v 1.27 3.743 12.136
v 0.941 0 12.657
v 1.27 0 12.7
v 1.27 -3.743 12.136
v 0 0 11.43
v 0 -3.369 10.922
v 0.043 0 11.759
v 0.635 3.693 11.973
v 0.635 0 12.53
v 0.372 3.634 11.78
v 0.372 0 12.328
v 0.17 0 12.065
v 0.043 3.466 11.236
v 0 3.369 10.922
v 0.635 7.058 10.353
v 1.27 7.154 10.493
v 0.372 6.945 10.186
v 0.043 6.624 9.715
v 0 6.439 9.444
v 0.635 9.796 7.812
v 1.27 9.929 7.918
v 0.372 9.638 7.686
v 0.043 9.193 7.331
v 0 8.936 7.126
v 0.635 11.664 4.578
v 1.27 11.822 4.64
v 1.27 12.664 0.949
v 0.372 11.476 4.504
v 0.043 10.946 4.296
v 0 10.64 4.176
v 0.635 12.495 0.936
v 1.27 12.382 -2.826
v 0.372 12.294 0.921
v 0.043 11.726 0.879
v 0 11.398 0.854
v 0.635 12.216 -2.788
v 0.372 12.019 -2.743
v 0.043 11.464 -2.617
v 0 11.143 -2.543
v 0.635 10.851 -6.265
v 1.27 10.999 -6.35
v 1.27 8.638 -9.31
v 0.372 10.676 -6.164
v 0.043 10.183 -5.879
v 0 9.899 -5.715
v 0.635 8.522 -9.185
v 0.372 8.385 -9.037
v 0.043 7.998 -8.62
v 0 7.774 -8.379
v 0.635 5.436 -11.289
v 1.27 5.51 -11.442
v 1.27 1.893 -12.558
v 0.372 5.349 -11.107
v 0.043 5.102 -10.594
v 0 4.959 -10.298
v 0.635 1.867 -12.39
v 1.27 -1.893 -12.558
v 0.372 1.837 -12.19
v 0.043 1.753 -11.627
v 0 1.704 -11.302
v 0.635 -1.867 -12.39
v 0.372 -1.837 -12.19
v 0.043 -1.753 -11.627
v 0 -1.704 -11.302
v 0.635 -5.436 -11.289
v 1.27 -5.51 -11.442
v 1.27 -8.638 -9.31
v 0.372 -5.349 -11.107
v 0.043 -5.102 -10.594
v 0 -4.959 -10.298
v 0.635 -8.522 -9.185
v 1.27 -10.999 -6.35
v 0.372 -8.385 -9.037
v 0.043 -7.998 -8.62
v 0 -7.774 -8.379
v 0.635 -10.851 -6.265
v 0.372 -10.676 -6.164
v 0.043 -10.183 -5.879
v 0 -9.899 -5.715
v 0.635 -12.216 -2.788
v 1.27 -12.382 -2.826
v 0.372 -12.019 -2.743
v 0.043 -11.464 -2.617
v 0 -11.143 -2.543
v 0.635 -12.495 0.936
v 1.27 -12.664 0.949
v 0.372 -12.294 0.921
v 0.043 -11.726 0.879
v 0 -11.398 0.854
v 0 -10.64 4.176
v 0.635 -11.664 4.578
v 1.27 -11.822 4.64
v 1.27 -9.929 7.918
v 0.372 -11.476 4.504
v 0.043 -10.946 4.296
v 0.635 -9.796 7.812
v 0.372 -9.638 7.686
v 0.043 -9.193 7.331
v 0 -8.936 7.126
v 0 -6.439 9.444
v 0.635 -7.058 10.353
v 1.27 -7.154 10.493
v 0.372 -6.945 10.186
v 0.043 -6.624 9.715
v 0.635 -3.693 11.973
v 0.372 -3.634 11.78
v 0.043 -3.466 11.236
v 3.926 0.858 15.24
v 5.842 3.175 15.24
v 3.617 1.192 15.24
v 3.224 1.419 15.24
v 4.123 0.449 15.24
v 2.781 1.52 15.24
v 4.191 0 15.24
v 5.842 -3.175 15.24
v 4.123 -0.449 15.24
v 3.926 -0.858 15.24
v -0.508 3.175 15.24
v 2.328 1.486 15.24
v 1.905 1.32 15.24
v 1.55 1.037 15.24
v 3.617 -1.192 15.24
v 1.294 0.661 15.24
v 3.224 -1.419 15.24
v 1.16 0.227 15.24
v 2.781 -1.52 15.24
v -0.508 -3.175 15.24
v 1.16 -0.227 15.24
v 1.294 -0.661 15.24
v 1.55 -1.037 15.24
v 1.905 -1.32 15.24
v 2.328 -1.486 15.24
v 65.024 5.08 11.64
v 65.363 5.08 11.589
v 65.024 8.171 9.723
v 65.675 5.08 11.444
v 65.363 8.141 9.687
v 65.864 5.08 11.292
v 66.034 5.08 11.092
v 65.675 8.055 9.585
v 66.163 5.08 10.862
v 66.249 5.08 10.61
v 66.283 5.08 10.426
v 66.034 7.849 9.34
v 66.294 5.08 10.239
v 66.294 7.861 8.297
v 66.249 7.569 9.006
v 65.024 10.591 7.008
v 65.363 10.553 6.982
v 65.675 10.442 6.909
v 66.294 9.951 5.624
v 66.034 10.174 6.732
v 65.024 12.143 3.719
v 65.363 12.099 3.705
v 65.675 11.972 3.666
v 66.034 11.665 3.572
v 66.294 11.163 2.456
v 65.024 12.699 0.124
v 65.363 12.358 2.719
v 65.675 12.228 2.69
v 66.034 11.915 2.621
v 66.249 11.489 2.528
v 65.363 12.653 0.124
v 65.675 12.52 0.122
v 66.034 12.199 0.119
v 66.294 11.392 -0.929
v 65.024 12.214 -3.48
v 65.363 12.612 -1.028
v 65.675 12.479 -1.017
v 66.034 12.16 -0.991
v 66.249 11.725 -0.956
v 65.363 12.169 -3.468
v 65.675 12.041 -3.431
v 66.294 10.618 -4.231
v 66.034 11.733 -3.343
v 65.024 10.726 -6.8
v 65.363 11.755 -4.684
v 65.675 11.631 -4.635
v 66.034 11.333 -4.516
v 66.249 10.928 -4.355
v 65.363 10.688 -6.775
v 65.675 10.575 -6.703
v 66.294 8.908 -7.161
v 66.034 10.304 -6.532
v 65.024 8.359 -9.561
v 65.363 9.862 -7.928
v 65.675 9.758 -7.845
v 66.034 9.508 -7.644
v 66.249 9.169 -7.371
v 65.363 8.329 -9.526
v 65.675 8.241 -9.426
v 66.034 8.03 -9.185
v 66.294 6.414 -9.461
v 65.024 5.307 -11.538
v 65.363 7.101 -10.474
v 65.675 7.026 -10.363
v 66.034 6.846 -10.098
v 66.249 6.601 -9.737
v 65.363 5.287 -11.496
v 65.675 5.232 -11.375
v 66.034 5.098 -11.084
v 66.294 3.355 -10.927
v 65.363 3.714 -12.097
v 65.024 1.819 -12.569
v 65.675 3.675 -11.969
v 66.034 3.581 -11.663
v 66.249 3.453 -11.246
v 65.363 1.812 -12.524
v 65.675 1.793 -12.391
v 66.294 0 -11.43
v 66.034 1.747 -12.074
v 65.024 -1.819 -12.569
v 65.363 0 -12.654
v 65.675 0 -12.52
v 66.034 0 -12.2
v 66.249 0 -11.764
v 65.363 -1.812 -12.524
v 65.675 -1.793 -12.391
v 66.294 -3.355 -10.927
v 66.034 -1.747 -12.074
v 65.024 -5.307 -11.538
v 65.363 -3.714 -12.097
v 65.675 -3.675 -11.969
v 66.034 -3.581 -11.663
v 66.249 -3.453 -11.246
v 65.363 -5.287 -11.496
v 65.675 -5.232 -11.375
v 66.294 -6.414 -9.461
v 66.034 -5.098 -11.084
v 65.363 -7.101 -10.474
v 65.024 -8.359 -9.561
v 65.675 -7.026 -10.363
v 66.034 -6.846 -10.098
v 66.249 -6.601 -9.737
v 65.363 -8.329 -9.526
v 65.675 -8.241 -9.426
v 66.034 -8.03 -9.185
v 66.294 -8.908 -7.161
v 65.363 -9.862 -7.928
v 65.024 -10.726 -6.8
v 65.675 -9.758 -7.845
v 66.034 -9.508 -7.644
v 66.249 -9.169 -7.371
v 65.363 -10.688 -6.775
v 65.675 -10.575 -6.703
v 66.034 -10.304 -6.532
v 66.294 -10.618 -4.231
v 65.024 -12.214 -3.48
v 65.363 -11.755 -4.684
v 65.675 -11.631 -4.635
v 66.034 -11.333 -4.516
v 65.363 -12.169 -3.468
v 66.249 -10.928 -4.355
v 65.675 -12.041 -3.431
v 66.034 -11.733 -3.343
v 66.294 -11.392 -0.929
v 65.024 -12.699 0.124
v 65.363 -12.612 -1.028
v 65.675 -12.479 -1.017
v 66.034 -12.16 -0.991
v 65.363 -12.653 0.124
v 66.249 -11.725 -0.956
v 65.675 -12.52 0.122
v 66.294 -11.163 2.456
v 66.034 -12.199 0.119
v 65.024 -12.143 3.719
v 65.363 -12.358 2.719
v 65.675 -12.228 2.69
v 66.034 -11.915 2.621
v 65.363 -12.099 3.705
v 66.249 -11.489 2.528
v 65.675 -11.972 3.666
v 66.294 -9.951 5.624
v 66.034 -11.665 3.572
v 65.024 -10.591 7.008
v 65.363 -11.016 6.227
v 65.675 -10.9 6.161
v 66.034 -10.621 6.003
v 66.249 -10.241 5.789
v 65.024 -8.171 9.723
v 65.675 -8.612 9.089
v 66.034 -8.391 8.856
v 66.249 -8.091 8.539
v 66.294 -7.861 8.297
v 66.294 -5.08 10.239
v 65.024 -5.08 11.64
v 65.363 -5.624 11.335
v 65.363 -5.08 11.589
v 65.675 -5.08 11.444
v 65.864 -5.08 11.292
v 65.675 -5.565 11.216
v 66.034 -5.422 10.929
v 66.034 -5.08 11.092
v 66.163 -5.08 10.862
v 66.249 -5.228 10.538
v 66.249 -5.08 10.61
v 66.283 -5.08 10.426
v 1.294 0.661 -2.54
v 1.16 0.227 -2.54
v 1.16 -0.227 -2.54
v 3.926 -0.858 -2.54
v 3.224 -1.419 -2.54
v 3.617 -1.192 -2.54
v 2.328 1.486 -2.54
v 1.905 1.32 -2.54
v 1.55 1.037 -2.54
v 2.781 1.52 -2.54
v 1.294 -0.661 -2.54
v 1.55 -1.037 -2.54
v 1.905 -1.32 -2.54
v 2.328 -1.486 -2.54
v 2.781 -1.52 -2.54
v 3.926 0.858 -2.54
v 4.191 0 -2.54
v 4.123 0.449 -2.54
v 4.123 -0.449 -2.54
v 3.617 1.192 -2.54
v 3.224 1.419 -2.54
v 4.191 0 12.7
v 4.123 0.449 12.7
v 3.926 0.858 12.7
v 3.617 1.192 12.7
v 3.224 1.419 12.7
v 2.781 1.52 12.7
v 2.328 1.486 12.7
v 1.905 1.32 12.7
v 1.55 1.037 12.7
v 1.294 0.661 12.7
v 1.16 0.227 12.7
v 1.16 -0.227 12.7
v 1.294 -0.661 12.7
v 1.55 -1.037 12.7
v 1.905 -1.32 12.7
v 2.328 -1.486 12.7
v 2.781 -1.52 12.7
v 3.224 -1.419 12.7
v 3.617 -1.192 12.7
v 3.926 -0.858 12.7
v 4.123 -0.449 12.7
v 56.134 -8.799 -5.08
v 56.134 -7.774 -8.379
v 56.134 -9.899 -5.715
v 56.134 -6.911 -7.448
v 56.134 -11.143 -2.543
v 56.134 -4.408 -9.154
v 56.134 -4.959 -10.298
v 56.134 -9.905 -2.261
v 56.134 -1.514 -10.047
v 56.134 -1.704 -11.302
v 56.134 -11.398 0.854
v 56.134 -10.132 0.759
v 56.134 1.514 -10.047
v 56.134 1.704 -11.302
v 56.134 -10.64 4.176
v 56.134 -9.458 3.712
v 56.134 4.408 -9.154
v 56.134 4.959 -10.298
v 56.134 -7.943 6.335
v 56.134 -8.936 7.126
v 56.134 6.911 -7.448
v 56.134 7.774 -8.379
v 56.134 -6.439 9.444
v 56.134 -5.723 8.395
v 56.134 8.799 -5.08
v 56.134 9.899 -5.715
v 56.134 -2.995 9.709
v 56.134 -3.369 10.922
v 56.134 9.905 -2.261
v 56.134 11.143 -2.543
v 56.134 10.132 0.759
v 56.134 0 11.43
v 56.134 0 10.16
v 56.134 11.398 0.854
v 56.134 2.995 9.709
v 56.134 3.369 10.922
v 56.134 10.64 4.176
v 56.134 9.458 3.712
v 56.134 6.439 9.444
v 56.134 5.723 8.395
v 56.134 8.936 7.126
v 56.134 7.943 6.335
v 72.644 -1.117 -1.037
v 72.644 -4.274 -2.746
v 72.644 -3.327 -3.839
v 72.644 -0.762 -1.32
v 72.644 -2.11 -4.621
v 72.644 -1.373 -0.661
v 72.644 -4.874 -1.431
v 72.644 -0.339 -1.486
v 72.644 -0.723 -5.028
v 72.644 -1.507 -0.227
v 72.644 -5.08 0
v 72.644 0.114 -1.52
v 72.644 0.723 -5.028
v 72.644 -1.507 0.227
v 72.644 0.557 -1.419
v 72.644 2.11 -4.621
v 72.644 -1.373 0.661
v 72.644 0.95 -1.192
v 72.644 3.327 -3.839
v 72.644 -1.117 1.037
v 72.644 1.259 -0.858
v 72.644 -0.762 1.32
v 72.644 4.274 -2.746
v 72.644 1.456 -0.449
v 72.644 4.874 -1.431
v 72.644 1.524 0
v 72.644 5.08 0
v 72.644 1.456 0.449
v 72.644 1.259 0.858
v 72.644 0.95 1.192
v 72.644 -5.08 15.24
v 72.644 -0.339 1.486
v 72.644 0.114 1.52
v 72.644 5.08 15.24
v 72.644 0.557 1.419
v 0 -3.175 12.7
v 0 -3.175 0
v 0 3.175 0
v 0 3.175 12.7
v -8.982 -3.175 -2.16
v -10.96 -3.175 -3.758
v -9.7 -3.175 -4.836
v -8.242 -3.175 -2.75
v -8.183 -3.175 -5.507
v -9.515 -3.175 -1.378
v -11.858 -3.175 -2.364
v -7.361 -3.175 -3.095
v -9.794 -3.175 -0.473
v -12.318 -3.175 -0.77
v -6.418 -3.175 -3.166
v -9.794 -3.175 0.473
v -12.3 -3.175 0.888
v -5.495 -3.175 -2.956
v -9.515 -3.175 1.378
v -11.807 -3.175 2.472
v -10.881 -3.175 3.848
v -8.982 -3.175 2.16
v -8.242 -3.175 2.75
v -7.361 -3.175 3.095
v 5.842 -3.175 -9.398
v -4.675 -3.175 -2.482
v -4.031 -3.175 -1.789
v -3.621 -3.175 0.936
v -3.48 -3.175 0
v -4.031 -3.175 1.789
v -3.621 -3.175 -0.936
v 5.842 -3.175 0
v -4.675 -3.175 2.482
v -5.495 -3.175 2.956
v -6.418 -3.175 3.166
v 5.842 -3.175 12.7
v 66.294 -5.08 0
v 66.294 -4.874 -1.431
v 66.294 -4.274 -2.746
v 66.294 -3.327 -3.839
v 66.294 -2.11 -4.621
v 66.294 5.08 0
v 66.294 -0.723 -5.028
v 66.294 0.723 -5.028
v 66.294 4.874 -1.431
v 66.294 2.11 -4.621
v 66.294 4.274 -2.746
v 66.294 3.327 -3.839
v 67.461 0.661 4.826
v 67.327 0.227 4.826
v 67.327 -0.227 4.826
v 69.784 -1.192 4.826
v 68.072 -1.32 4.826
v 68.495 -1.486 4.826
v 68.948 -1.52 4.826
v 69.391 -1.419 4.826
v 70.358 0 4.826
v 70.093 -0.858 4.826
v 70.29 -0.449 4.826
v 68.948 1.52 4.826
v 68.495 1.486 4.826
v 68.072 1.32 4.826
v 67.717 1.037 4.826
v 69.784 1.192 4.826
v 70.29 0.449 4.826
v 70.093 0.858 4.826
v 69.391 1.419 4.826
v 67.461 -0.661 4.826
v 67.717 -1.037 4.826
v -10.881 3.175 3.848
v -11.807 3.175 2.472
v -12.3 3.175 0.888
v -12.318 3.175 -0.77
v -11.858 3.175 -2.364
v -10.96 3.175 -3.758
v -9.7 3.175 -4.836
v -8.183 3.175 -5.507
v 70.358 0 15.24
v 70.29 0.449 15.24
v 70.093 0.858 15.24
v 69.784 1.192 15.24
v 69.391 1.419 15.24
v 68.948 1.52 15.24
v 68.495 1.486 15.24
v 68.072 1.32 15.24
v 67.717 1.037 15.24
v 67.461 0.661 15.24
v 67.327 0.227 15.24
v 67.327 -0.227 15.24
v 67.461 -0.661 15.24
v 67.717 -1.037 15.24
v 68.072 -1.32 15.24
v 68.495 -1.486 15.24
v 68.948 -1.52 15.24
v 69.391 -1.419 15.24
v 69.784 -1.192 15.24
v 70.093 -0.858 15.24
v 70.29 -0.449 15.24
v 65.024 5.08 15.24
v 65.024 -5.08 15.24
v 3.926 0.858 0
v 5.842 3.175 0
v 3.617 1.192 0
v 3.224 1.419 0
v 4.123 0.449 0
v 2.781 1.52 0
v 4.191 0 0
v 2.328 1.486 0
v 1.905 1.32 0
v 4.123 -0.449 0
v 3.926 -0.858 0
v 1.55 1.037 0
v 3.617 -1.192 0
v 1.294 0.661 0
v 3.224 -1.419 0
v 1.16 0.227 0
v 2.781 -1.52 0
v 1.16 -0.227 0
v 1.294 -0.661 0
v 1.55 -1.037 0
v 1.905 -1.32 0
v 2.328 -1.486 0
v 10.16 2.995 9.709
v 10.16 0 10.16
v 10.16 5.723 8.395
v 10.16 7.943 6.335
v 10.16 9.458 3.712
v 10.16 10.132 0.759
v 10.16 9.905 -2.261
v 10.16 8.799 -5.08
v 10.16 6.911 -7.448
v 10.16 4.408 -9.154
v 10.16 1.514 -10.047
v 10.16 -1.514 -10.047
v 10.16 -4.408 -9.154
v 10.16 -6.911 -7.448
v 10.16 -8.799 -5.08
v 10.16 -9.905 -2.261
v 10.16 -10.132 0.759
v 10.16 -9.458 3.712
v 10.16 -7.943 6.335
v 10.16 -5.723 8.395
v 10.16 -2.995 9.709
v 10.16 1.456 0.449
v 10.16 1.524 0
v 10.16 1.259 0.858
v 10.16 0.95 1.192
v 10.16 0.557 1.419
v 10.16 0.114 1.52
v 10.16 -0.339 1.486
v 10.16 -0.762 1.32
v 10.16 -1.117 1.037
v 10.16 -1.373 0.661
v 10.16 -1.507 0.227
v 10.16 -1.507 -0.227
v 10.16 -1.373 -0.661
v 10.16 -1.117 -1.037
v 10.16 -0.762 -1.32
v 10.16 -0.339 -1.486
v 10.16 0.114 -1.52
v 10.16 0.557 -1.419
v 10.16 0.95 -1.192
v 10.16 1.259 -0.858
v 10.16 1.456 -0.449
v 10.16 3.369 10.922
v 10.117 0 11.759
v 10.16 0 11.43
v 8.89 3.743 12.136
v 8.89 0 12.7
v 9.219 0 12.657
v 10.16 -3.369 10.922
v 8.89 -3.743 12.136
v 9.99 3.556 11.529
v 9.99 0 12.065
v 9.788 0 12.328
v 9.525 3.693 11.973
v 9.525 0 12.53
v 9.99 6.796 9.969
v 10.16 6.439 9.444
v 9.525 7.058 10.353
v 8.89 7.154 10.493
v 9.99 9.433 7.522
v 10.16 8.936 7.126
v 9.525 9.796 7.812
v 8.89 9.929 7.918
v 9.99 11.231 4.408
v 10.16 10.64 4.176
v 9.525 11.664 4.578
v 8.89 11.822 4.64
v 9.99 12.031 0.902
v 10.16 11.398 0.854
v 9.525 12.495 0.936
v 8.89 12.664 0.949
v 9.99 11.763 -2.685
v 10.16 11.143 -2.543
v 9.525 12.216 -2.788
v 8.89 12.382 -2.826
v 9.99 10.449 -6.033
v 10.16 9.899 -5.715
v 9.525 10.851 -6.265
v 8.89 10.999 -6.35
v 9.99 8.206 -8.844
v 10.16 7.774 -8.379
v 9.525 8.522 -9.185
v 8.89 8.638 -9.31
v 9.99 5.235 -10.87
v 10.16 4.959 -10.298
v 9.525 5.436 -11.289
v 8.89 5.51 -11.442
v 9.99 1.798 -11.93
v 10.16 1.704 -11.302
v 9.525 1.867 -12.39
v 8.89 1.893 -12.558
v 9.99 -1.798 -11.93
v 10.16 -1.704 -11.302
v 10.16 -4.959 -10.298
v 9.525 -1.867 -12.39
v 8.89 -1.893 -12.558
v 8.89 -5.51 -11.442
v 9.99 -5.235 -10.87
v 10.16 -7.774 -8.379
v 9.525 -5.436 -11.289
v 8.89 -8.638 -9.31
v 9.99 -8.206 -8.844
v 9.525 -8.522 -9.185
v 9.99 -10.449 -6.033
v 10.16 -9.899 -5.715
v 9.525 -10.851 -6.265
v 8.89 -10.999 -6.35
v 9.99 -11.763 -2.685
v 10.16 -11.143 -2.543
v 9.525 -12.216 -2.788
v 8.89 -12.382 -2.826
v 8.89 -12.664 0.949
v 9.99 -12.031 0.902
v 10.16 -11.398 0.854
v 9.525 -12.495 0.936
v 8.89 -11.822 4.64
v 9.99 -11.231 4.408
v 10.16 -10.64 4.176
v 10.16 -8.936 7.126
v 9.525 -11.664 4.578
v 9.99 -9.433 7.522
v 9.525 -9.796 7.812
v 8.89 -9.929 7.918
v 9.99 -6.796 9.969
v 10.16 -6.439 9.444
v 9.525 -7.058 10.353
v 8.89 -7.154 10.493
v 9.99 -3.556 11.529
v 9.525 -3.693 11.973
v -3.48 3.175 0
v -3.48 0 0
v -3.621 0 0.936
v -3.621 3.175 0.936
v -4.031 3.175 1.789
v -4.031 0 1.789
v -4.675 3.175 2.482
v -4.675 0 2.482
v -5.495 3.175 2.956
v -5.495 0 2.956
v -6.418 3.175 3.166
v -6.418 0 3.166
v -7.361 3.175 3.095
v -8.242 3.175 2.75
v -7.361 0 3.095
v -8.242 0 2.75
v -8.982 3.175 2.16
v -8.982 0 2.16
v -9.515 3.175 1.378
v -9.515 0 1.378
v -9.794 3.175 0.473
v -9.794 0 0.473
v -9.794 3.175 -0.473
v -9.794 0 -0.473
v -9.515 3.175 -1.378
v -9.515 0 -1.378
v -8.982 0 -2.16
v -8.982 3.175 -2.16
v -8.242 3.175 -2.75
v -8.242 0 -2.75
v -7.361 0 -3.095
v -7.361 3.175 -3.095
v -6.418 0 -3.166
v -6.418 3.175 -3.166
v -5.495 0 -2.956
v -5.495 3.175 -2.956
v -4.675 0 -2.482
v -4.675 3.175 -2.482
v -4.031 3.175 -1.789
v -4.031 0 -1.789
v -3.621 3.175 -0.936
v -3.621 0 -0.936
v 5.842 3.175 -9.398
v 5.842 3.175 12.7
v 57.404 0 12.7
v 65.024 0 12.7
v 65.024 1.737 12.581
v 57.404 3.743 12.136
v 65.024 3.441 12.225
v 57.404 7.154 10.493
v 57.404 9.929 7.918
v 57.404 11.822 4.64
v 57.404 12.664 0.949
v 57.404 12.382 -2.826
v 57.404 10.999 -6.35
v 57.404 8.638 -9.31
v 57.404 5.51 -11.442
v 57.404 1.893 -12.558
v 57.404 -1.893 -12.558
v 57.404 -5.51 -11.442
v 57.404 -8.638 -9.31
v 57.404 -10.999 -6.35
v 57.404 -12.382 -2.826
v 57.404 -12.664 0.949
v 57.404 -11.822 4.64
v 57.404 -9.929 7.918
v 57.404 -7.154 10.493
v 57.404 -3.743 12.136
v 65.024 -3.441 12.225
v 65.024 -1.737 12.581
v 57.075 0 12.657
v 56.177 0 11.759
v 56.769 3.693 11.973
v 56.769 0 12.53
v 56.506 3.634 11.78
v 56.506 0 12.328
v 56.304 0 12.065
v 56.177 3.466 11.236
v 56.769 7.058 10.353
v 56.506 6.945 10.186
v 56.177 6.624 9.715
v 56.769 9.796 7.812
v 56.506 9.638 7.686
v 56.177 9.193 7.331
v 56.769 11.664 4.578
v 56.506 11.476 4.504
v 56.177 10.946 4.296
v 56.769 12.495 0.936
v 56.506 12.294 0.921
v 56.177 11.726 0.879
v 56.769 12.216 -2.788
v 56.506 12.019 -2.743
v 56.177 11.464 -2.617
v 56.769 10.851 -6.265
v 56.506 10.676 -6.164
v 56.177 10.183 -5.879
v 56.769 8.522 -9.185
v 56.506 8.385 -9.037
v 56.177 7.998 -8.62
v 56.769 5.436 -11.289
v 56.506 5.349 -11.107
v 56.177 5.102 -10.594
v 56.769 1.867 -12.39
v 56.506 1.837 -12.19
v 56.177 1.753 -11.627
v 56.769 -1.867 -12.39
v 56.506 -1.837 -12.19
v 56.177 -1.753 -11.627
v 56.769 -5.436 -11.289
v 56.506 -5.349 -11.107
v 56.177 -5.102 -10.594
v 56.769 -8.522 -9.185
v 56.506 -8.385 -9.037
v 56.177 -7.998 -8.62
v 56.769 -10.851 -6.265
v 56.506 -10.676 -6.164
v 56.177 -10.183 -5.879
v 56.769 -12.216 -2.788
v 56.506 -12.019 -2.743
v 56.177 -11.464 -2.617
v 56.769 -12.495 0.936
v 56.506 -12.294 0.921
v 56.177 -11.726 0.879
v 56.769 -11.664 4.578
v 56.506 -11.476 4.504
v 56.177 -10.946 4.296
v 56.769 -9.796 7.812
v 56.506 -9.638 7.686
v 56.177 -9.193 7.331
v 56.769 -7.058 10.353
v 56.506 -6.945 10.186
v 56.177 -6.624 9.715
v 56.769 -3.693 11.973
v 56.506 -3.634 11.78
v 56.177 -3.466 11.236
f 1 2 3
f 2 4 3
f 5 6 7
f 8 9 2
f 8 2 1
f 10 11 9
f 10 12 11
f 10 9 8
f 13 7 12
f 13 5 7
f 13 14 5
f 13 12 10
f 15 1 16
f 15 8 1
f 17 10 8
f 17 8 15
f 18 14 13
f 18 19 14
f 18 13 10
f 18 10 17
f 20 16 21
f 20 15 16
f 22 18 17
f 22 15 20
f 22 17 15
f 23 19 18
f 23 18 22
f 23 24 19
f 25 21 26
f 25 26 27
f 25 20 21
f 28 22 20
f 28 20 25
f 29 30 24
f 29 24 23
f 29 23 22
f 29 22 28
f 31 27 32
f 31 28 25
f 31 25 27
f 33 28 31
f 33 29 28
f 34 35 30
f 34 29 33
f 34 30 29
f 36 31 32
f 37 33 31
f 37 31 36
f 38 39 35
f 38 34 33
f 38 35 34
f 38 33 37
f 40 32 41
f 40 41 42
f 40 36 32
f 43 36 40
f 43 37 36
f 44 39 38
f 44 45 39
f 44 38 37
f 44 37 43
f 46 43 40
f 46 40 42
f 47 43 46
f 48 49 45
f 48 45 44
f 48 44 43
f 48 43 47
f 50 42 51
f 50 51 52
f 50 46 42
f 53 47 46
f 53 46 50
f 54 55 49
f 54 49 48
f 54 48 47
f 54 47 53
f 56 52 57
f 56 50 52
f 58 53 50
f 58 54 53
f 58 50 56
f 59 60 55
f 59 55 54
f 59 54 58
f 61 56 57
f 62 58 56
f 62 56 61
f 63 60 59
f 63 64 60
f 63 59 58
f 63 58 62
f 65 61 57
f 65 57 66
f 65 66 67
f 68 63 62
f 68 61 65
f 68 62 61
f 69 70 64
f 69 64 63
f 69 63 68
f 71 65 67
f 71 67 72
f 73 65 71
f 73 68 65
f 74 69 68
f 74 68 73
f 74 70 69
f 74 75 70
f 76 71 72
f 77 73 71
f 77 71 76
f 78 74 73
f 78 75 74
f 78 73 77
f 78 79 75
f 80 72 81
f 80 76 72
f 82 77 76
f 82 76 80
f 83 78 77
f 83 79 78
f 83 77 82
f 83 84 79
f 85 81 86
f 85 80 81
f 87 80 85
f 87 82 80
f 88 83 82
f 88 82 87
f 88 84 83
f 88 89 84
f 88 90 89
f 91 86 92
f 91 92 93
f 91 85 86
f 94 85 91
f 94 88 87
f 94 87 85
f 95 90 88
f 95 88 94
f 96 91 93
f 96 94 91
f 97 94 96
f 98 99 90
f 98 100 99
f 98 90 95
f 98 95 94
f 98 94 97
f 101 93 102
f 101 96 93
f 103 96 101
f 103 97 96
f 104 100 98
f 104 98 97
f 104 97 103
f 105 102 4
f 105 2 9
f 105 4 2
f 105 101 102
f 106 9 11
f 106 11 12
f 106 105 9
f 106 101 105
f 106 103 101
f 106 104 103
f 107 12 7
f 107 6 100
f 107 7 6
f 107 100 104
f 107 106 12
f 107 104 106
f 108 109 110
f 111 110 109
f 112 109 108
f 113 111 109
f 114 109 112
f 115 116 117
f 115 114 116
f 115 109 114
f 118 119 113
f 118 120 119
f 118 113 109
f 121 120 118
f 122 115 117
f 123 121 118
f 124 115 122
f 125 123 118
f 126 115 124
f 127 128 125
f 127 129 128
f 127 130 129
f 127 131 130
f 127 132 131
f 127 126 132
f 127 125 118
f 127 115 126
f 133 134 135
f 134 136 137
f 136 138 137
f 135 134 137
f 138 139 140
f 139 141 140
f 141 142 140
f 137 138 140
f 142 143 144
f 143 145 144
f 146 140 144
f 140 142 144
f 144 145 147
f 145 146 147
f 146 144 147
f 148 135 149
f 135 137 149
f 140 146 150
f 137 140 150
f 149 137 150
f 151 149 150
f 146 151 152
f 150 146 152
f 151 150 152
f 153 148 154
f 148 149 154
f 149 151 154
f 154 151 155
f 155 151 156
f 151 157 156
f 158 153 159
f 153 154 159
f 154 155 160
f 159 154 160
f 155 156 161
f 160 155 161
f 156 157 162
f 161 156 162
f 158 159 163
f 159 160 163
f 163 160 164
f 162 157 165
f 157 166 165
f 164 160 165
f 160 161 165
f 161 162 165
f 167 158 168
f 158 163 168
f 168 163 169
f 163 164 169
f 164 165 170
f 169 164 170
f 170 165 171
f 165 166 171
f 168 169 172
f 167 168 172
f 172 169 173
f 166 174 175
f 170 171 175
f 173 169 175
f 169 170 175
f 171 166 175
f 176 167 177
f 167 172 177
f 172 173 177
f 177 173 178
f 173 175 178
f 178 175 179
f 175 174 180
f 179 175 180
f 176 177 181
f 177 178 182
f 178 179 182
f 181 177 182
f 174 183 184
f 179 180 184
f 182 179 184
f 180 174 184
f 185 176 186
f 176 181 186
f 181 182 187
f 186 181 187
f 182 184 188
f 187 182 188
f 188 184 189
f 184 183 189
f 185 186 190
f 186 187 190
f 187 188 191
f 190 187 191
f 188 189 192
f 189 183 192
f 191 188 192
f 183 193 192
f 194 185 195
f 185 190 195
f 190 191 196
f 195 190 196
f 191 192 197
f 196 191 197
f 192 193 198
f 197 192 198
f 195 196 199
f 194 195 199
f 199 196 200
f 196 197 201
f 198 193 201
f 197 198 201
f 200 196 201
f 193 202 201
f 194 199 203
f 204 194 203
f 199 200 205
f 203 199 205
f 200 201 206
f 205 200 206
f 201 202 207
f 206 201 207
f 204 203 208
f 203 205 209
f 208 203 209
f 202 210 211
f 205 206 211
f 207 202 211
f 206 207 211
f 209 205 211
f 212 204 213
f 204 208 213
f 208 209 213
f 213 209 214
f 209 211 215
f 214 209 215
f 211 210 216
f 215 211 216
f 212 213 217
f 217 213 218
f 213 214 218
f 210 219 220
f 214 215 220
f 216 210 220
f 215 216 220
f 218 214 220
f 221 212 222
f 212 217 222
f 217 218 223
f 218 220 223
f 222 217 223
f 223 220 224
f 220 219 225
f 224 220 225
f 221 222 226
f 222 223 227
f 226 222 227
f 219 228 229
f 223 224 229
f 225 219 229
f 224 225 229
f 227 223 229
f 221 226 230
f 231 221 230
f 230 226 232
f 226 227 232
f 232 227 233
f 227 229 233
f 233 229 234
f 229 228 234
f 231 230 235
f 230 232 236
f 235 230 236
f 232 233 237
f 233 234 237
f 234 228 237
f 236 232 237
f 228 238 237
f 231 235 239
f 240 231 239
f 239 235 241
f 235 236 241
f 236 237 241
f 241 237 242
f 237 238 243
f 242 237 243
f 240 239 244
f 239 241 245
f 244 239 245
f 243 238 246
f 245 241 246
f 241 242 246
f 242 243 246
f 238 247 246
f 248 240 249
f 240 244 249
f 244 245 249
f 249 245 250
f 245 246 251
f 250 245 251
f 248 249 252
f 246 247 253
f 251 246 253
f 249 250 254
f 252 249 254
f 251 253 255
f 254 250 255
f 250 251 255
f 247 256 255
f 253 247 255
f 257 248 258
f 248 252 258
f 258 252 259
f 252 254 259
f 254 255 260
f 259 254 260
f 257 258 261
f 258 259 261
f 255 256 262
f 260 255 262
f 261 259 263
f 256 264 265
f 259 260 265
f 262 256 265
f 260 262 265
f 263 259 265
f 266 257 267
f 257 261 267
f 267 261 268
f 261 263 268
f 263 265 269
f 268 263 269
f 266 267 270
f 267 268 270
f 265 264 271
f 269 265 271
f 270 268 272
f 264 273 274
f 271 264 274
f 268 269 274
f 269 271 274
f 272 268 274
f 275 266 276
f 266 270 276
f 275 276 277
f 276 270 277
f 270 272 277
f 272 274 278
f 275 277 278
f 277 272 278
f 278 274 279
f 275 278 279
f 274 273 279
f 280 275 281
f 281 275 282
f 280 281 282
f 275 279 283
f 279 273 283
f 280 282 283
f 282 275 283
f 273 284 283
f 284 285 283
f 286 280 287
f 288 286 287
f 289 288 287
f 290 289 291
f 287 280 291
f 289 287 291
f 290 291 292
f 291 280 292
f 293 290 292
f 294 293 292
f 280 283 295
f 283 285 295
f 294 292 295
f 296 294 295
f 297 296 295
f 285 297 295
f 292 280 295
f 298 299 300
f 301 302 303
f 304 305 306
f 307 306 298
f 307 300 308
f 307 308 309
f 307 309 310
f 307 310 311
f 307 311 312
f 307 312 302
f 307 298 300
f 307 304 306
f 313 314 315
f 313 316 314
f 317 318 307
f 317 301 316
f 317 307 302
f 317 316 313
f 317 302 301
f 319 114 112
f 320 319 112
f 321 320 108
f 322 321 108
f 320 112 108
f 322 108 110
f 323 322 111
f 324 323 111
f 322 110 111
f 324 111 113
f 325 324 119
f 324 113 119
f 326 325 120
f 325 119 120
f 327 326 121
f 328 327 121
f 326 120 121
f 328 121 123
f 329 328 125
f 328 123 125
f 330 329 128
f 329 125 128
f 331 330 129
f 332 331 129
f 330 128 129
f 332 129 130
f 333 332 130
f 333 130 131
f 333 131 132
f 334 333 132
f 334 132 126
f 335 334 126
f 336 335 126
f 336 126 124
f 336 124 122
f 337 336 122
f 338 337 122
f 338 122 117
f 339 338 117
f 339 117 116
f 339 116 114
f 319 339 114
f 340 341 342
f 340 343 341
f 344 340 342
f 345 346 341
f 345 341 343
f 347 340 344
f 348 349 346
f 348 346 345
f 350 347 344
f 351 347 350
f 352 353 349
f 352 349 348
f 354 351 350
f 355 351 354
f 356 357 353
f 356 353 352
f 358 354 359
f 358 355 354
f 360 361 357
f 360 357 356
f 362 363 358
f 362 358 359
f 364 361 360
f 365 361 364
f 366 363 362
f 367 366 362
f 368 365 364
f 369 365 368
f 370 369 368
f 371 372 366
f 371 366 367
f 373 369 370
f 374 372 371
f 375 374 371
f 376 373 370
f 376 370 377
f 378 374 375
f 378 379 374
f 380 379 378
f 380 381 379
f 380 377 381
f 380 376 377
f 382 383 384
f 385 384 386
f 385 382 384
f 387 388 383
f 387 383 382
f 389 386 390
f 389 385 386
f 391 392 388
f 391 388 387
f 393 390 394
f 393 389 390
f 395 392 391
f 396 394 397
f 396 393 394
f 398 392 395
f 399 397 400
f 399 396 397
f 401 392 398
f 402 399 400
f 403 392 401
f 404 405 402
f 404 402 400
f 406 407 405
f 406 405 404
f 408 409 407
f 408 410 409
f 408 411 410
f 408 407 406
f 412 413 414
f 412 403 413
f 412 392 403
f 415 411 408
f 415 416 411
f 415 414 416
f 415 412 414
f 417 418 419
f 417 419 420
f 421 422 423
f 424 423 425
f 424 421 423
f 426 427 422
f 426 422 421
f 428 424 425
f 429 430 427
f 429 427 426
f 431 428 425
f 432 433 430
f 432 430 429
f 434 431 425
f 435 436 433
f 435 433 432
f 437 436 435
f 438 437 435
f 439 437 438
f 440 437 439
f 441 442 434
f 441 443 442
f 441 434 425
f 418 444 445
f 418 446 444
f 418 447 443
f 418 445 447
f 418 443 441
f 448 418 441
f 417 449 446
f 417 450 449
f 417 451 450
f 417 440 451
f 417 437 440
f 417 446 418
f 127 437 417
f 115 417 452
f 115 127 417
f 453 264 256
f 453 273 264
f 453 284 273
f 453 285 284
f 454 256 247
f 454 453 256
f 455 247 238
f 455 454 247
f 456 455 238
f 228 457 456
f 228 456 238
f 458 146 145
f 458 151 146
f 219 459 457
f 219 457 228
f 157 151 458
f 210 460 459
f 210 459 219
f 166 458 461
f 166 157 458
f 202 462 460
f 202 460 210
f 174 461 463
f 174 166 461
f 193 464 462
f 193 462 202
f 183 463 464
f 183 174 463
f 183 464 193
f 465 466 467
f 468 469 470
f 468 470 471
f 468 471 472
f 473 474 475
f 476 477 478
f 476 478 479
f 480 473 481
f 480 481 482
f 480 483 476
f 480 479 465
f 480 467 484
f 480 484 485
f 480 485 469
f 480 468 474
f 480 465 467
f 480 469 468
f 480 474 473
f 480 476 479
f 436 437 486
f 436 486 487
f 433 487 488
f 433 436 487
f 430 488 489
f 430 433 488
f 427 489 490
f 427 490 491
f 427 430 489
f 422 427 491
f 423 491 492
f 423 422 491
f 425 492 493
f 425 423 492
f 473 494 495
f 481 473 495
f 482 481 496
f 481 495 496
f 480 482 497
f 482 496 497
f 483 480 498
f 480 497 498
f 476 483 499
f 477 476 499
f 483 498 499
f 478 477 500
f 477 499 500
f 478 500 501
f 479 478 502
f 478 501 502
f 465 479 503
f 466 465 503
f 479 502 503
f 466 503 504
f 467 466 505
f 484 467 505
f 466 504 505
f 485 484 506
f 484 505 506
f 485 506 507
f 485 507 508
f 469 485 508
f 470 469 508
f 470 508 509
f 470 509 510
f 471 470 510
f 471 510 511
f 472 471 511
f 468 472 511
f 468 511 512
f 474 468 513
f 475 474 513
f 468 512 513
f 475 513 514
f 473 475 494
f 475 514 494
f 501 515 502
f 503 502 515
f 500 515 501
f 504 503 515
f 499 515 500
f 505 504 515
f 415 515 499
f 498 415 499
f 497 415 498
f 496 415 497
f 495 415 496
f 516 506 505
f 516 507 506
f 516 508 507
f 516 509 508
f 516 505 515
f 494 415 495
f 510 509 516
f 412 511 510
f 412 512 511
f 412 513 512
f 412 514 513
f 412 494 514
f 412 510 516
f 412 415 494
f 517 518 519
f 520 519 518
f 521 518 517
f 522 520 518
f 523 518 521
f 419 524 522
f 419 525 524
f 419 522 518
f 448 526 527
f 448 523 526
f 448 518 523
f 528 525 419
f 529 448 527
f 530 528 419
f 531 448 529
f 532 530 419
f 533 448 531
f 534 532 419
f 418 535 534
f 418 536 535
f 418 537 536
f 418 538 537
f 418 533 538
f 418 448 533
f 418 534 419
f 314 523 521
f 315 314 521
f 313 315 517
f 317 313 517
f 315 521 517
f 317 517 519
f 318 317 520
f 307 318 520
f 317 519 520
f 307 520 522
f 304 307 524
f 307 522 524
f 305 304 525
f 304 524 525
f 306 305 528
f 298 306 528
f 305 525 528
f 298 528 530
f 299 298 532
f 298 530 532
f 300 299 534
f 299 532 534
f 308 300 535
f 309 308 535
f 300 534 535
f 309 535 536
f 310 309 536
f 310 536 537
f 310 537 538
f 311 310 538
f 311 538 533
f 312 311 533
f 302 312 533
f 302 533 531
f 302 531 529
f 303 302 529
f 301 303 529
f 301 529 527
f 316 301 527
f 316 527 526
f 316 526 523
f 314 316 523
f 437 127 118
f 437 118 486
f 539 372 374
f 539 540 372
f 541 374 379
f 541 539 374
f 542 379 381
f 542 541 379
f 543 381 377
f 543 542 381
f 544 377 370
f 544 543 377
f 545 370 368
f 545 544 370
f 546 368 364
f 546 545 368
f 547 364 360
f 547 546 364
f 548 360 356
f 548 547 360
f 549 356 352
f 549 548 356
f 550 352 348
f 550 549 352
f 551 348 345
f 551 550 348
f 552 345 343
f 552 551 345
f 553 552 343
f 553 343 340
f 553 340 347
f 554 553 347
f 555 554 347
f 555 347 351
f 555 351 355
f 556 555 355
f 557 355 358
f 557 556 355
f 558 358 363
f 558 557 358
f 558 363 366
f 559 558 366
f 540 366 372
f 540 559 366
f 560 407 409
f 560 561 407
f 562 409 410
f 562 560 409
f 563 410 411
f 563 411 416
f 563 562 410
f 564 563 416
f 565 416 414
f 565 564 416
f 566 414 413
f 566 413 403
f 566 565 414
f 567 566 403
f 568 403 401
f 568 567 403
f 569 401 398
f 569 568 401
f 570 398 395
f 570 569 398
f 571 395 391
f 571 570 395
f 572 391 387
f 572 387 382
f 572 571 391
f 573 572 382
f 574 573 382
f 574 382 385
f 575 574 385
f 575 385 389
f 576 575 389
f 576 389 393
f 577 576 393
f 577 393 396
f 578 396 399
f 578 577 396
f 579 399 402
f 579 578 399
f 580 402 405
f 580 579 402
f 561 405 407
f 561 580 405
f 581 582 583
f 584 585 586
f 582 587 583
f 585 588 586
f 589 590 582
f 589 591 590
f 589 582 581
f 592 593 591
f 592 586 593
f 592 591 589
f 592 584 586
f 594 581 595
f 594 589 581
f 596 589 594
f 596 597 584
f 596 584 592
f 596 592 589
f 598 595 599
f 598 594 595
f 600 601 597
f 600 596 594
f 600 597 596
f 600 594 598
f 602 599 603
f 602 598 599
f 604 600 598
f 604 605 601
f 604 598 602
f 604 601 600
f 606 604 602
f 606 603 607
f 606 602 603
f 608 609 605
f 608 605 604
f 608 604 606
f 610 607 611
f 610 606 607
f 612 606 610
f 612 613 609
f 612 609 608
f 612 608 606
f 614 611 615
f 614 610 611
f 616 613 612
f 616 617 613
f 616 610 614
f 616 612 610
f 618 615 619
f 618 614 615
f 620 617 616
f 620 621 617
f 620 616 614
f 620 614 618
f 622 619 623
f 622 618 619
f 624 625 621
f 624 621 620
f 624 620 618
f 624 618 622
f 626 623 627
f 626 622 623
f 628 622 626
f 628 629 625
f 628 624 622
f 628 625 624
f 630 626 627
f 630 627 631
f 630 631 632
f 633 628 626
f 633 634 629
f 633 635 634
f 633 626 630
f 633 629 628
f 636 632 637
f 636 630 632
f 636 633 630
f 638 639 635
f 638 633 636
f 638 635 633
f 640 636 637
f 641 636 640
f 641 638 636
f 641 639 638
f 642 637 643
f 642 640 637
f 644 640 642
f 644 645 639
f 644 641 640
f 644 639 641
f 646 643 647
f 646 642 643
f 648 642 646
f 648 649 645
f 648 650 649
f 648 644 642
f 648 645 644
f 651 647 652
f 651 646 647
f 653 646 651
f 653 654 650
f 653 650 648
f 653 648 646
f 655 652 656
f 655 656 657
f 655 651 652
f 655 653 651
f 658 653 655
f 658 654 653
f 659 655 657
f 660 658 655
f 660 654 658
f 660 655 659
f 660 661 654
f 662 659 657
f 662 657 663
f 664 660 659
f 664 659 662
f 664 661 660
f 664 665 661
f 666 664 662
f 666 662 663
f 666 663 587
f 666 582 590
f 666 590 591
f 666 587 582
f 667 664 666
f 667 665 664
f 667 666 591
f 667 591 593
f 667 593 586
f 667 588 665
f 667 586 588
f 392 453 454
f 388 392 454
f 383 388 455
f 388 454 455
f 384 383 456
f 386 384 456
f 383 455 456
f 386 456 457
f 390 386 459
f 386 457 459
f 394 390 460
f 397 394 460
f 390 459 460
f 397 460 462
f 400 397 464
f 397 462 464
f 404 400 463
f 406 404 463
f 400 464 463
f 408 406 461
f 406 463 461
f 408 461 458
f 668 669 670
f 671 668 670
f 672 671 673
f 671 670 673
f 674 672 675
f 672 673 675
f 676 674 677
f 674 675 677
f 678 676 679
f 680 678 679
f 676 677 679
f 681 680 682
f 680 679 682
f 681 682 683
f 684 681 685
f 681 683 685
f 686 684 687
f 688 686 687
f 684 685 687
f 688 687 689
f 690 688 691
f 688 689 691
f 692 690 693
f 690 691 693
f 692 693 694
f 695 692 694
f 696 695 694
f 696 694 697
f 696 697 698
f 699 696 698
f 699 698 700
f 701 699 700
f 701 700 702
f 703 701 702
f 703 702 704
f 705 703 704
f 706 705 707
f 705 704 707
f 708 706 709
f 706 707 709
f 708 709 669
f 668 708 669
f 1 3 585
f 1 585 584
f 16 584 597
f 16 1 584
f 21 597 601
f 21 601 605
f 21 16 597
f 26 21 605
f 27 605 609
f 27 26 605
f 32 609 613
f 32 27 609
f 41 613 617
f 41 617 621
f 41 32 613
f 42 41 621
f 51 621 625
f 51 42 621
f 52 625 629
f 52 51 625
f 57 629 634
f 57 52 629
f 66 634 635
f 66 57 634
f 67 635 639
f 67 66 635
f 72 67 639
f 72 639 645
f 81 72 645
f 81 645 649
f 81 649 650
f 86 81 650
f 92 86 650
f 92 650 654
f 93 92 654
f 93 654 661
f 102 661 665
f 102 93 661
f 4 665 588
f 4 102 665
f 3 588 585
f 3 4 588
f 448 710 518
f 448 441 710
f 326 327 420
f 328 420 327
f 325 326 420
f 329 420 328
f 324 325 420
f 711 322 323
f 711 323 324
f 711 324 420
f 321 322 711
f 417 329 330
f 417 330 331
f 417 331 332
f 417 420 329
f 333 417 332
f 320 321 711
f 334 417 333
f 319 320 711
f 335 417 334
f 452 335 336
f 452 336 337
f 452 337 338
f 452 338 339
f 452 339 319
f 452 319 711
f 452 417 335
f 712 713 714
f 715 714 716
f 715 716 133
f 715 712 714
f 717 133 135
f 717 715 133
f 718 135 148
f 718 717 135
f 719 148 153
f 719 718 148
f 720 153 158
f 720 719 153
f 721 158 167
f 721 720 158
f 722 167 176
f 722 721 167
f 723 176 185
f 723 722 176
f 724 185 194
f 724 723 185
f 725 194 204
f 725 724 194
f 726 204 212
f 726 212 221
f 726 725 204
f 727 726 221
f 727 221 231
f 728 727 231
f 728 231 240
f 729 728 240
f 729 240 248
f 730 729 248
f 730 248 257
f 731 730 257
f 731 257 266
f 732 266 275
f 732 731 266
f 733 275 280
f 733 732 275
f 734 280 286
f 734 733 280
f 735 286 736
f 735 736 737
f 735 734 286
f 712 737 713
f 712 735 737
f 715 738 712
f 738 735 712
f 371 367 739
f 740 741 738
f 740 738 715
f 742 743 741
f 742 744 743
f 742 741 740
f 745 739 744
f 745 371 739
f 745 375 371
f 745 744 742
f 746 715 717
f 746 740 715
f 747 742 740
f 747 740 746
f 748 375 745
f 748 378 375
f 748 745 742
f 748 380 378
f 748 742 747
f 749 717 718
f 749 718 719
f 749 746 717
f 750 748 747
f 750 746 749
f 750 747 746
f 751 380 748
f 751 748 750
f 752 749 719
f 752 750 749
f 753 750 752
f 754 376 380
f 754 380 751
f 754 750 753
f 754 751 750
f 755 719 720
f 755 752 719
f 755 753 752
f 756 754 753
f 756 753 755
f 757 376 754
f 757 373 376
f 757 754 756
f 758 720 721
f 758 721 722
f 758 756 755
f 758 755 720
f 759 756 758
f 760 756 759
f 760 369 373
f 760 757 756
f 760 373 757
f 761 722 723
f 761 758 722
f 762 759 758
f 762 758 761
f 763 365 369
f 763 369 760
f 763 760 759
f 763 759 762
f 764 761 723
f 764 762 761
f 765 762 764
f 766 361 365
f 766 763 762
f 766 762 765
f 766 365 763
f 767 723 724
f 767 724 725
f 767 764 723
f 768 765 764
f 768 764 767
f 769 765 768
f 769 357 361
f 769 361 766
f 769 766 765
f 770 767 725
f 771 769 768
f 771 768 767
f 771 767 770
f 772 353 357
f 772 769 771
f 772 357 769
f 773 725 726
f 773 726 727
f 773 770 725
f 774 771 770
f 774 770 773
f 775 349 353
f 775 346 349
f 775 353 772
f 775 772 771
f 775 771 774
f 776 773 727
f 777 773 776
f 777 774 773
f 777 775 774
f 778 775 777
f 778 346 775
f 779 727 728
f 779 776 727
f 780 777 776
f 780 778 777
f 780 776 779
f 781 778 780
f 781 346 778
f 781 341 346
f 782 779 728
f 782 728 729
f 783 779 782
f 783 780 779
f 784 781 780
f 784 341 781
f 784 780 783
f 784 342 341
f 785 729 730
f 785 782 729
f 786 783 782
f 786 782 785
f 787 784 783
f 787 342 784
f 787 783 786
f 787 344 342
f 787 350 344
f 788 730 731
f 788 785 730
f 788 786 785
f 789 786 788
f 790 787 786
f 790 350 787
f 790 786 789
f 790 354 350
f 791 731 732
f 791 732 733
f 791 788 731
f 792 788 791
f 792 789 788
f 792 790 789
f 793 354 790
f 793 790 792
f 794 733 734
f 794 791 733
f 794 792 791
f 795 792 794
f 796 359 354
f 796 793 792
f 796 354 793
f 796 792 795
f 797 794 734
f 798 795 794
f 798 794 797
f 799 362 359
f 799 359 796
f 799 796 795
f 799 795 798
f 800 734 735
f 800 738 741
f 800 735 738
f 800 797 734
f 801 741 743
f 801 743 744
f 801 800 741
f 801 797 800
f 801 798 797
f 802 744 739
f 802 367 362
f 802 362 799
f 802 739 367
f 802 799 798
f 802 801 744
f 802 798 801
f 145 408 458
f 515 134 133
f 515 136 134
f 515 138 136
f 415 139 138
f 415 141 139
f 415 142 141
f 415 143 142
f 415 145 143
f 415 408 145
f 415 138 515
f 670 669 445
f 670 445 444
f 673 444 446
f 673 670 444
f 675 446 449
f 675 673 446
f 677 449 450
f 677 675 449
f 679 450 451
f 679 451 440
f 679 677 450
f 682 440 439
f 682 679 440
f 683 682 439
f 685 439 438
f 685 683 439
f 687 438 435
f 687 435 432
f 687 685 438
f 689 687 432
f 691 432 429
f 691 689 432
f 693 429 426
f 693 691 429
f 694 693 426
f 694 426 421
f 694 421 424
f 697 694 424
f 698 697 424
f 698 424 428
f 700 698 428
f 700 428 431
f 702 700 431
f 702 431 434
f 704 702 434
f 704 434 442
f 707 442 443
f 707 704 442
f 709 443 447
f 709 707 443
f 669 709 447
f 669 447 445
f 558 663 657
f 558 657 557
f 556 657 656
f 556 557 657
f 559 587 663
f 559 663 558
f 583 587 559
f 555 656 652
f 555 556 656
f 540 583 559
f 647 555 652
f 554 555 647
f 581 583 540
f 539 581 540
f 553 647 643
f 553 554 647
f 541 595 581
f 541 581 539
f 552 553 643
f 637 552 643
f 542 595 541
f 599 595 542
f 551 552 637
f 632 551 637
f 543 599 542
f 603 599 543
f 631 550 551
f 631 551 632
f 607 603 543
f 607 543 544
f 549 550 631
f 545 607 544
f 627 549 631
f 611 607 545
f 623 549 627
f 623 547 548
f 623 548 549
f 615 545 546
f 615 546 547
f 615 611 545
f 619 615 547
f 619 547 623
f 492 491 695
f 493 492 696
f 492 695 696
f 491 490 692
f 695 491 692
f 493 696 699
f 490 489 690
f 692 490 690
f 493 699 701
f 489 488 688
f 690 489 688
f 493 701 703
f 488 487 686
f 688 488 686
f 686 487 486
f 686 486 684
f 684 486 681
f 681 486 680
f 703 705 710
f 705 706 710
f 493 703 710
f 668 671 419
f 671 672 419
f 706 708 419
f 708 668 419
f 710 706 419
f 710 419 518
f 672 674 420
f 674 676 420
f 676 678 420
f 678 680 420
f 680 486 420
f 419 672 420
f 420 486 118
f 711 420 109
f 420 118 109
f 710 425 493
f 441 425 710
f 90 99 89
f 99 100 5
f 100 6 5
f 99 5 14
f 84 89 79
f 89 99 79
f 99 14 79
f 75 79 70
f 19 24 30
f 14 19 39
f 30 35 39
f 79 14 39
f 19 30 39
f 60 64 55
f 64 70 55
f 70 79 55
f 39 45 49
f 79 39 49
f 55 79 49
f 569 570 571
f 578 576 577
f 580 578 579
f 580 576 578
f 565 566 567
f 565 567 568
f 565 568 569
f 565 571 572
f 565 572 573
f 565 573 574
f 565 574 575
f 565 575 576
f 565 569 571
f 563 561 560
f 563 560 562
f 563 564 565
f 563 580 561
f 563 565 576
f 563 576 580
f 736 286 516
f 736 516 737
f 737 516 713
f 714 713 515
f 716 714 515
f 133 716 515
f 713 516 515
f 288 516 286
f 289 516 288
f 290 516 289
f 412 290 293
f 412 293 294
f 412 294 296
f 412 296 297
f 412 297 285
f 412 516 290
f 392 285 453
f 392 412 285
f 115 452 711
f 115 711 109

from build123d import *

# Parameters (mm, degrees)
F0_W          = 5.842
F0_H          = 12.7
F0_R          = 3.175
F2_DEPTH      = 3.175
F2_DEPTH_BACK = 3.175
F3_R          = 1.524
F4_DEPTH      = 6.35
F4_DEPTH_BACK = 1.27
F5_DEPTH      = 56.134
F7_R          = 1.524
F8_DEPTH      = 10.414
F6_R          = 1.524
F9_DEPTH      = 17.78
F10_R         = 1.27


with BuildPart() as f1:
    # F0 (on Front) → F1 (revolve)
    with BuildSketch(Plane.XZ):
        Polygon((5.842, 12.7), (5.842, 0), (66.294, 0), (66.294, 12.7), (56.134, 12.7), (56.134, 10.16), (10.16, 10.16), (10.16, 12.7), align=None)
        with Locations((2.921, 6.35)):
            Rectangle(F0_W, F0_H)
    revolve(axis=Axis((33.147, 0, 0), (-1, 0, 0)))

    # F3 (on face) → F4 (join, two sides)
    with BuildSketch(Plane.YZ.offset(66.294)) as f4_sk:
        with BuildLine():
            ThreePointArc((-5.08, 11.6397422652), (0, 12.7), (5.08, 11.6397422652))
            Line((5.08, 11.6397422652), (5.08, 15.24))
            Line((5.08, 15.24), (-5.08, 15.24))
            Line((-5.08, 15.24), (-5.08, 11.6397422652))
        make_face()
        with BuildLine():
            ThreePointArc((-5.08, 0), (0, 5.08), (5.08, 0))
            Line((5.08, 0), (5.08, 11.6397422652))
            ThreePointArc((5.08, 11.6397422652), (0, 12.7), (-5.08, 11.6397422652))
            Line((-5.08, 11.6397422652), (-5.08, 0))
        make_face()
        with BuildLine():
            ThreePointArc((-5.08, 0), (0, -5.08), (5.08, 0))
            ThreePointArc((5.08, 0), (0, 5.08), (-5.08, 0))
        make_face()
        Circle(F3_R, mode=Mode.SUBTRACT)
    extrude(amount=F4_DEPTH)
    extrude(f4_sk.sketch, amount=-F4_DEPTH_BACK)

    # F3 (on face) → F5 (cut)
    with BuildSketch(Plane.YZ.offset(66.294)):
        Circle(F3_R)
    extrude(amount=-F5_DEPTH, mode=Mode.SUBTRACT)

    # F7 (on face) → F8 (cut)
    with BuildSketch(Plane.XY.offset(15.24)):
        with Locations((68.834, 0)):
            Circle(F7_R)
    extrude(amount=-F8_DEPTH, mode=Mode.SUBTRACT)

    # F10
    f10_edges = [f1.edges().sort_by_distance(p)[0] for p in [
        (0, 0, -12.7),
        (10.16, 0, -12.7),
        (56.134, 0, -12.7),
        (66.294, 0, -12.7),
    ]]
    fillet(f10_edges, radius=F10_R)


with BuildPart() as f2:
    # F0 (on Front) → F2 (new body, two sides)
    with BuildSketch(Plane.XZ) as f2_sk:
        with BuildLine():
            Line((5.842, 0), (0, 0))
            Line((0, 0), (-0.9398, 0))
            ThreePointArc((-0.9398, 0), (-3.1957909266, -4.5493385486), (-8.1826630726, -5.5069827884))
            Line((-8.1826630726, -5.5069827884), (5.842, -9.398))
            Line((5.842, -9.398), (5.842, 0))
        make_face()
        with BuildLine():
            ThreePointArc((-8.1826630726, -5.5069827884), (-3.1957909266, -4.5493385486), (-0.9398, 0))
            ThreePointArc((-0.9398, 0), (-4.5919612295, 5.3297205562), (-10.8806298187, 3.8475430269))
            ThreePointArc((-10.8806298187, 3.8475430269), (-12.1459778134, -1.5837270034), (-8.1826630726, -5.5069827884))
        make_face()
        with Locations((-6.6548, 0)):
            Circle(F0_R, mode=Mode.SUBTRACT)
        with BuildLine():
            Line((-0.9398, 0), (0, 0))
            Line((0, 0), (0, 12.7))
            Line((0, 12.7), (5.842, 12.7))
            Line((5.842, 12.7), (5.842, 15.24))
            Line((5.842, 15.24), (-0.508, 15.24))
            Line((-0.508, 15.24), (-10.8806298187, 3.8475430269))
            ThreePointArc((-10.8806298187, 3.8475430269), (-4.5919612295, 5.3297205562), (-0.9398, 0))
        make_face()
    extrude(amount=F2_DEPTH)
    extrude(f2_sk.sketch, amount=-F2_DEPTH_BACK)

    # F6 (on face) → F9 (cut)
    with BuildSketch(Plane.XY.offset(15.24)):
        with Locations((2.667, 0)):
            Circle(F6_R)
    extrude(amount=-F9_DEPTH, mode=Mode.SUBTRACT)


solid = Compound([f1.part, f2.part])
